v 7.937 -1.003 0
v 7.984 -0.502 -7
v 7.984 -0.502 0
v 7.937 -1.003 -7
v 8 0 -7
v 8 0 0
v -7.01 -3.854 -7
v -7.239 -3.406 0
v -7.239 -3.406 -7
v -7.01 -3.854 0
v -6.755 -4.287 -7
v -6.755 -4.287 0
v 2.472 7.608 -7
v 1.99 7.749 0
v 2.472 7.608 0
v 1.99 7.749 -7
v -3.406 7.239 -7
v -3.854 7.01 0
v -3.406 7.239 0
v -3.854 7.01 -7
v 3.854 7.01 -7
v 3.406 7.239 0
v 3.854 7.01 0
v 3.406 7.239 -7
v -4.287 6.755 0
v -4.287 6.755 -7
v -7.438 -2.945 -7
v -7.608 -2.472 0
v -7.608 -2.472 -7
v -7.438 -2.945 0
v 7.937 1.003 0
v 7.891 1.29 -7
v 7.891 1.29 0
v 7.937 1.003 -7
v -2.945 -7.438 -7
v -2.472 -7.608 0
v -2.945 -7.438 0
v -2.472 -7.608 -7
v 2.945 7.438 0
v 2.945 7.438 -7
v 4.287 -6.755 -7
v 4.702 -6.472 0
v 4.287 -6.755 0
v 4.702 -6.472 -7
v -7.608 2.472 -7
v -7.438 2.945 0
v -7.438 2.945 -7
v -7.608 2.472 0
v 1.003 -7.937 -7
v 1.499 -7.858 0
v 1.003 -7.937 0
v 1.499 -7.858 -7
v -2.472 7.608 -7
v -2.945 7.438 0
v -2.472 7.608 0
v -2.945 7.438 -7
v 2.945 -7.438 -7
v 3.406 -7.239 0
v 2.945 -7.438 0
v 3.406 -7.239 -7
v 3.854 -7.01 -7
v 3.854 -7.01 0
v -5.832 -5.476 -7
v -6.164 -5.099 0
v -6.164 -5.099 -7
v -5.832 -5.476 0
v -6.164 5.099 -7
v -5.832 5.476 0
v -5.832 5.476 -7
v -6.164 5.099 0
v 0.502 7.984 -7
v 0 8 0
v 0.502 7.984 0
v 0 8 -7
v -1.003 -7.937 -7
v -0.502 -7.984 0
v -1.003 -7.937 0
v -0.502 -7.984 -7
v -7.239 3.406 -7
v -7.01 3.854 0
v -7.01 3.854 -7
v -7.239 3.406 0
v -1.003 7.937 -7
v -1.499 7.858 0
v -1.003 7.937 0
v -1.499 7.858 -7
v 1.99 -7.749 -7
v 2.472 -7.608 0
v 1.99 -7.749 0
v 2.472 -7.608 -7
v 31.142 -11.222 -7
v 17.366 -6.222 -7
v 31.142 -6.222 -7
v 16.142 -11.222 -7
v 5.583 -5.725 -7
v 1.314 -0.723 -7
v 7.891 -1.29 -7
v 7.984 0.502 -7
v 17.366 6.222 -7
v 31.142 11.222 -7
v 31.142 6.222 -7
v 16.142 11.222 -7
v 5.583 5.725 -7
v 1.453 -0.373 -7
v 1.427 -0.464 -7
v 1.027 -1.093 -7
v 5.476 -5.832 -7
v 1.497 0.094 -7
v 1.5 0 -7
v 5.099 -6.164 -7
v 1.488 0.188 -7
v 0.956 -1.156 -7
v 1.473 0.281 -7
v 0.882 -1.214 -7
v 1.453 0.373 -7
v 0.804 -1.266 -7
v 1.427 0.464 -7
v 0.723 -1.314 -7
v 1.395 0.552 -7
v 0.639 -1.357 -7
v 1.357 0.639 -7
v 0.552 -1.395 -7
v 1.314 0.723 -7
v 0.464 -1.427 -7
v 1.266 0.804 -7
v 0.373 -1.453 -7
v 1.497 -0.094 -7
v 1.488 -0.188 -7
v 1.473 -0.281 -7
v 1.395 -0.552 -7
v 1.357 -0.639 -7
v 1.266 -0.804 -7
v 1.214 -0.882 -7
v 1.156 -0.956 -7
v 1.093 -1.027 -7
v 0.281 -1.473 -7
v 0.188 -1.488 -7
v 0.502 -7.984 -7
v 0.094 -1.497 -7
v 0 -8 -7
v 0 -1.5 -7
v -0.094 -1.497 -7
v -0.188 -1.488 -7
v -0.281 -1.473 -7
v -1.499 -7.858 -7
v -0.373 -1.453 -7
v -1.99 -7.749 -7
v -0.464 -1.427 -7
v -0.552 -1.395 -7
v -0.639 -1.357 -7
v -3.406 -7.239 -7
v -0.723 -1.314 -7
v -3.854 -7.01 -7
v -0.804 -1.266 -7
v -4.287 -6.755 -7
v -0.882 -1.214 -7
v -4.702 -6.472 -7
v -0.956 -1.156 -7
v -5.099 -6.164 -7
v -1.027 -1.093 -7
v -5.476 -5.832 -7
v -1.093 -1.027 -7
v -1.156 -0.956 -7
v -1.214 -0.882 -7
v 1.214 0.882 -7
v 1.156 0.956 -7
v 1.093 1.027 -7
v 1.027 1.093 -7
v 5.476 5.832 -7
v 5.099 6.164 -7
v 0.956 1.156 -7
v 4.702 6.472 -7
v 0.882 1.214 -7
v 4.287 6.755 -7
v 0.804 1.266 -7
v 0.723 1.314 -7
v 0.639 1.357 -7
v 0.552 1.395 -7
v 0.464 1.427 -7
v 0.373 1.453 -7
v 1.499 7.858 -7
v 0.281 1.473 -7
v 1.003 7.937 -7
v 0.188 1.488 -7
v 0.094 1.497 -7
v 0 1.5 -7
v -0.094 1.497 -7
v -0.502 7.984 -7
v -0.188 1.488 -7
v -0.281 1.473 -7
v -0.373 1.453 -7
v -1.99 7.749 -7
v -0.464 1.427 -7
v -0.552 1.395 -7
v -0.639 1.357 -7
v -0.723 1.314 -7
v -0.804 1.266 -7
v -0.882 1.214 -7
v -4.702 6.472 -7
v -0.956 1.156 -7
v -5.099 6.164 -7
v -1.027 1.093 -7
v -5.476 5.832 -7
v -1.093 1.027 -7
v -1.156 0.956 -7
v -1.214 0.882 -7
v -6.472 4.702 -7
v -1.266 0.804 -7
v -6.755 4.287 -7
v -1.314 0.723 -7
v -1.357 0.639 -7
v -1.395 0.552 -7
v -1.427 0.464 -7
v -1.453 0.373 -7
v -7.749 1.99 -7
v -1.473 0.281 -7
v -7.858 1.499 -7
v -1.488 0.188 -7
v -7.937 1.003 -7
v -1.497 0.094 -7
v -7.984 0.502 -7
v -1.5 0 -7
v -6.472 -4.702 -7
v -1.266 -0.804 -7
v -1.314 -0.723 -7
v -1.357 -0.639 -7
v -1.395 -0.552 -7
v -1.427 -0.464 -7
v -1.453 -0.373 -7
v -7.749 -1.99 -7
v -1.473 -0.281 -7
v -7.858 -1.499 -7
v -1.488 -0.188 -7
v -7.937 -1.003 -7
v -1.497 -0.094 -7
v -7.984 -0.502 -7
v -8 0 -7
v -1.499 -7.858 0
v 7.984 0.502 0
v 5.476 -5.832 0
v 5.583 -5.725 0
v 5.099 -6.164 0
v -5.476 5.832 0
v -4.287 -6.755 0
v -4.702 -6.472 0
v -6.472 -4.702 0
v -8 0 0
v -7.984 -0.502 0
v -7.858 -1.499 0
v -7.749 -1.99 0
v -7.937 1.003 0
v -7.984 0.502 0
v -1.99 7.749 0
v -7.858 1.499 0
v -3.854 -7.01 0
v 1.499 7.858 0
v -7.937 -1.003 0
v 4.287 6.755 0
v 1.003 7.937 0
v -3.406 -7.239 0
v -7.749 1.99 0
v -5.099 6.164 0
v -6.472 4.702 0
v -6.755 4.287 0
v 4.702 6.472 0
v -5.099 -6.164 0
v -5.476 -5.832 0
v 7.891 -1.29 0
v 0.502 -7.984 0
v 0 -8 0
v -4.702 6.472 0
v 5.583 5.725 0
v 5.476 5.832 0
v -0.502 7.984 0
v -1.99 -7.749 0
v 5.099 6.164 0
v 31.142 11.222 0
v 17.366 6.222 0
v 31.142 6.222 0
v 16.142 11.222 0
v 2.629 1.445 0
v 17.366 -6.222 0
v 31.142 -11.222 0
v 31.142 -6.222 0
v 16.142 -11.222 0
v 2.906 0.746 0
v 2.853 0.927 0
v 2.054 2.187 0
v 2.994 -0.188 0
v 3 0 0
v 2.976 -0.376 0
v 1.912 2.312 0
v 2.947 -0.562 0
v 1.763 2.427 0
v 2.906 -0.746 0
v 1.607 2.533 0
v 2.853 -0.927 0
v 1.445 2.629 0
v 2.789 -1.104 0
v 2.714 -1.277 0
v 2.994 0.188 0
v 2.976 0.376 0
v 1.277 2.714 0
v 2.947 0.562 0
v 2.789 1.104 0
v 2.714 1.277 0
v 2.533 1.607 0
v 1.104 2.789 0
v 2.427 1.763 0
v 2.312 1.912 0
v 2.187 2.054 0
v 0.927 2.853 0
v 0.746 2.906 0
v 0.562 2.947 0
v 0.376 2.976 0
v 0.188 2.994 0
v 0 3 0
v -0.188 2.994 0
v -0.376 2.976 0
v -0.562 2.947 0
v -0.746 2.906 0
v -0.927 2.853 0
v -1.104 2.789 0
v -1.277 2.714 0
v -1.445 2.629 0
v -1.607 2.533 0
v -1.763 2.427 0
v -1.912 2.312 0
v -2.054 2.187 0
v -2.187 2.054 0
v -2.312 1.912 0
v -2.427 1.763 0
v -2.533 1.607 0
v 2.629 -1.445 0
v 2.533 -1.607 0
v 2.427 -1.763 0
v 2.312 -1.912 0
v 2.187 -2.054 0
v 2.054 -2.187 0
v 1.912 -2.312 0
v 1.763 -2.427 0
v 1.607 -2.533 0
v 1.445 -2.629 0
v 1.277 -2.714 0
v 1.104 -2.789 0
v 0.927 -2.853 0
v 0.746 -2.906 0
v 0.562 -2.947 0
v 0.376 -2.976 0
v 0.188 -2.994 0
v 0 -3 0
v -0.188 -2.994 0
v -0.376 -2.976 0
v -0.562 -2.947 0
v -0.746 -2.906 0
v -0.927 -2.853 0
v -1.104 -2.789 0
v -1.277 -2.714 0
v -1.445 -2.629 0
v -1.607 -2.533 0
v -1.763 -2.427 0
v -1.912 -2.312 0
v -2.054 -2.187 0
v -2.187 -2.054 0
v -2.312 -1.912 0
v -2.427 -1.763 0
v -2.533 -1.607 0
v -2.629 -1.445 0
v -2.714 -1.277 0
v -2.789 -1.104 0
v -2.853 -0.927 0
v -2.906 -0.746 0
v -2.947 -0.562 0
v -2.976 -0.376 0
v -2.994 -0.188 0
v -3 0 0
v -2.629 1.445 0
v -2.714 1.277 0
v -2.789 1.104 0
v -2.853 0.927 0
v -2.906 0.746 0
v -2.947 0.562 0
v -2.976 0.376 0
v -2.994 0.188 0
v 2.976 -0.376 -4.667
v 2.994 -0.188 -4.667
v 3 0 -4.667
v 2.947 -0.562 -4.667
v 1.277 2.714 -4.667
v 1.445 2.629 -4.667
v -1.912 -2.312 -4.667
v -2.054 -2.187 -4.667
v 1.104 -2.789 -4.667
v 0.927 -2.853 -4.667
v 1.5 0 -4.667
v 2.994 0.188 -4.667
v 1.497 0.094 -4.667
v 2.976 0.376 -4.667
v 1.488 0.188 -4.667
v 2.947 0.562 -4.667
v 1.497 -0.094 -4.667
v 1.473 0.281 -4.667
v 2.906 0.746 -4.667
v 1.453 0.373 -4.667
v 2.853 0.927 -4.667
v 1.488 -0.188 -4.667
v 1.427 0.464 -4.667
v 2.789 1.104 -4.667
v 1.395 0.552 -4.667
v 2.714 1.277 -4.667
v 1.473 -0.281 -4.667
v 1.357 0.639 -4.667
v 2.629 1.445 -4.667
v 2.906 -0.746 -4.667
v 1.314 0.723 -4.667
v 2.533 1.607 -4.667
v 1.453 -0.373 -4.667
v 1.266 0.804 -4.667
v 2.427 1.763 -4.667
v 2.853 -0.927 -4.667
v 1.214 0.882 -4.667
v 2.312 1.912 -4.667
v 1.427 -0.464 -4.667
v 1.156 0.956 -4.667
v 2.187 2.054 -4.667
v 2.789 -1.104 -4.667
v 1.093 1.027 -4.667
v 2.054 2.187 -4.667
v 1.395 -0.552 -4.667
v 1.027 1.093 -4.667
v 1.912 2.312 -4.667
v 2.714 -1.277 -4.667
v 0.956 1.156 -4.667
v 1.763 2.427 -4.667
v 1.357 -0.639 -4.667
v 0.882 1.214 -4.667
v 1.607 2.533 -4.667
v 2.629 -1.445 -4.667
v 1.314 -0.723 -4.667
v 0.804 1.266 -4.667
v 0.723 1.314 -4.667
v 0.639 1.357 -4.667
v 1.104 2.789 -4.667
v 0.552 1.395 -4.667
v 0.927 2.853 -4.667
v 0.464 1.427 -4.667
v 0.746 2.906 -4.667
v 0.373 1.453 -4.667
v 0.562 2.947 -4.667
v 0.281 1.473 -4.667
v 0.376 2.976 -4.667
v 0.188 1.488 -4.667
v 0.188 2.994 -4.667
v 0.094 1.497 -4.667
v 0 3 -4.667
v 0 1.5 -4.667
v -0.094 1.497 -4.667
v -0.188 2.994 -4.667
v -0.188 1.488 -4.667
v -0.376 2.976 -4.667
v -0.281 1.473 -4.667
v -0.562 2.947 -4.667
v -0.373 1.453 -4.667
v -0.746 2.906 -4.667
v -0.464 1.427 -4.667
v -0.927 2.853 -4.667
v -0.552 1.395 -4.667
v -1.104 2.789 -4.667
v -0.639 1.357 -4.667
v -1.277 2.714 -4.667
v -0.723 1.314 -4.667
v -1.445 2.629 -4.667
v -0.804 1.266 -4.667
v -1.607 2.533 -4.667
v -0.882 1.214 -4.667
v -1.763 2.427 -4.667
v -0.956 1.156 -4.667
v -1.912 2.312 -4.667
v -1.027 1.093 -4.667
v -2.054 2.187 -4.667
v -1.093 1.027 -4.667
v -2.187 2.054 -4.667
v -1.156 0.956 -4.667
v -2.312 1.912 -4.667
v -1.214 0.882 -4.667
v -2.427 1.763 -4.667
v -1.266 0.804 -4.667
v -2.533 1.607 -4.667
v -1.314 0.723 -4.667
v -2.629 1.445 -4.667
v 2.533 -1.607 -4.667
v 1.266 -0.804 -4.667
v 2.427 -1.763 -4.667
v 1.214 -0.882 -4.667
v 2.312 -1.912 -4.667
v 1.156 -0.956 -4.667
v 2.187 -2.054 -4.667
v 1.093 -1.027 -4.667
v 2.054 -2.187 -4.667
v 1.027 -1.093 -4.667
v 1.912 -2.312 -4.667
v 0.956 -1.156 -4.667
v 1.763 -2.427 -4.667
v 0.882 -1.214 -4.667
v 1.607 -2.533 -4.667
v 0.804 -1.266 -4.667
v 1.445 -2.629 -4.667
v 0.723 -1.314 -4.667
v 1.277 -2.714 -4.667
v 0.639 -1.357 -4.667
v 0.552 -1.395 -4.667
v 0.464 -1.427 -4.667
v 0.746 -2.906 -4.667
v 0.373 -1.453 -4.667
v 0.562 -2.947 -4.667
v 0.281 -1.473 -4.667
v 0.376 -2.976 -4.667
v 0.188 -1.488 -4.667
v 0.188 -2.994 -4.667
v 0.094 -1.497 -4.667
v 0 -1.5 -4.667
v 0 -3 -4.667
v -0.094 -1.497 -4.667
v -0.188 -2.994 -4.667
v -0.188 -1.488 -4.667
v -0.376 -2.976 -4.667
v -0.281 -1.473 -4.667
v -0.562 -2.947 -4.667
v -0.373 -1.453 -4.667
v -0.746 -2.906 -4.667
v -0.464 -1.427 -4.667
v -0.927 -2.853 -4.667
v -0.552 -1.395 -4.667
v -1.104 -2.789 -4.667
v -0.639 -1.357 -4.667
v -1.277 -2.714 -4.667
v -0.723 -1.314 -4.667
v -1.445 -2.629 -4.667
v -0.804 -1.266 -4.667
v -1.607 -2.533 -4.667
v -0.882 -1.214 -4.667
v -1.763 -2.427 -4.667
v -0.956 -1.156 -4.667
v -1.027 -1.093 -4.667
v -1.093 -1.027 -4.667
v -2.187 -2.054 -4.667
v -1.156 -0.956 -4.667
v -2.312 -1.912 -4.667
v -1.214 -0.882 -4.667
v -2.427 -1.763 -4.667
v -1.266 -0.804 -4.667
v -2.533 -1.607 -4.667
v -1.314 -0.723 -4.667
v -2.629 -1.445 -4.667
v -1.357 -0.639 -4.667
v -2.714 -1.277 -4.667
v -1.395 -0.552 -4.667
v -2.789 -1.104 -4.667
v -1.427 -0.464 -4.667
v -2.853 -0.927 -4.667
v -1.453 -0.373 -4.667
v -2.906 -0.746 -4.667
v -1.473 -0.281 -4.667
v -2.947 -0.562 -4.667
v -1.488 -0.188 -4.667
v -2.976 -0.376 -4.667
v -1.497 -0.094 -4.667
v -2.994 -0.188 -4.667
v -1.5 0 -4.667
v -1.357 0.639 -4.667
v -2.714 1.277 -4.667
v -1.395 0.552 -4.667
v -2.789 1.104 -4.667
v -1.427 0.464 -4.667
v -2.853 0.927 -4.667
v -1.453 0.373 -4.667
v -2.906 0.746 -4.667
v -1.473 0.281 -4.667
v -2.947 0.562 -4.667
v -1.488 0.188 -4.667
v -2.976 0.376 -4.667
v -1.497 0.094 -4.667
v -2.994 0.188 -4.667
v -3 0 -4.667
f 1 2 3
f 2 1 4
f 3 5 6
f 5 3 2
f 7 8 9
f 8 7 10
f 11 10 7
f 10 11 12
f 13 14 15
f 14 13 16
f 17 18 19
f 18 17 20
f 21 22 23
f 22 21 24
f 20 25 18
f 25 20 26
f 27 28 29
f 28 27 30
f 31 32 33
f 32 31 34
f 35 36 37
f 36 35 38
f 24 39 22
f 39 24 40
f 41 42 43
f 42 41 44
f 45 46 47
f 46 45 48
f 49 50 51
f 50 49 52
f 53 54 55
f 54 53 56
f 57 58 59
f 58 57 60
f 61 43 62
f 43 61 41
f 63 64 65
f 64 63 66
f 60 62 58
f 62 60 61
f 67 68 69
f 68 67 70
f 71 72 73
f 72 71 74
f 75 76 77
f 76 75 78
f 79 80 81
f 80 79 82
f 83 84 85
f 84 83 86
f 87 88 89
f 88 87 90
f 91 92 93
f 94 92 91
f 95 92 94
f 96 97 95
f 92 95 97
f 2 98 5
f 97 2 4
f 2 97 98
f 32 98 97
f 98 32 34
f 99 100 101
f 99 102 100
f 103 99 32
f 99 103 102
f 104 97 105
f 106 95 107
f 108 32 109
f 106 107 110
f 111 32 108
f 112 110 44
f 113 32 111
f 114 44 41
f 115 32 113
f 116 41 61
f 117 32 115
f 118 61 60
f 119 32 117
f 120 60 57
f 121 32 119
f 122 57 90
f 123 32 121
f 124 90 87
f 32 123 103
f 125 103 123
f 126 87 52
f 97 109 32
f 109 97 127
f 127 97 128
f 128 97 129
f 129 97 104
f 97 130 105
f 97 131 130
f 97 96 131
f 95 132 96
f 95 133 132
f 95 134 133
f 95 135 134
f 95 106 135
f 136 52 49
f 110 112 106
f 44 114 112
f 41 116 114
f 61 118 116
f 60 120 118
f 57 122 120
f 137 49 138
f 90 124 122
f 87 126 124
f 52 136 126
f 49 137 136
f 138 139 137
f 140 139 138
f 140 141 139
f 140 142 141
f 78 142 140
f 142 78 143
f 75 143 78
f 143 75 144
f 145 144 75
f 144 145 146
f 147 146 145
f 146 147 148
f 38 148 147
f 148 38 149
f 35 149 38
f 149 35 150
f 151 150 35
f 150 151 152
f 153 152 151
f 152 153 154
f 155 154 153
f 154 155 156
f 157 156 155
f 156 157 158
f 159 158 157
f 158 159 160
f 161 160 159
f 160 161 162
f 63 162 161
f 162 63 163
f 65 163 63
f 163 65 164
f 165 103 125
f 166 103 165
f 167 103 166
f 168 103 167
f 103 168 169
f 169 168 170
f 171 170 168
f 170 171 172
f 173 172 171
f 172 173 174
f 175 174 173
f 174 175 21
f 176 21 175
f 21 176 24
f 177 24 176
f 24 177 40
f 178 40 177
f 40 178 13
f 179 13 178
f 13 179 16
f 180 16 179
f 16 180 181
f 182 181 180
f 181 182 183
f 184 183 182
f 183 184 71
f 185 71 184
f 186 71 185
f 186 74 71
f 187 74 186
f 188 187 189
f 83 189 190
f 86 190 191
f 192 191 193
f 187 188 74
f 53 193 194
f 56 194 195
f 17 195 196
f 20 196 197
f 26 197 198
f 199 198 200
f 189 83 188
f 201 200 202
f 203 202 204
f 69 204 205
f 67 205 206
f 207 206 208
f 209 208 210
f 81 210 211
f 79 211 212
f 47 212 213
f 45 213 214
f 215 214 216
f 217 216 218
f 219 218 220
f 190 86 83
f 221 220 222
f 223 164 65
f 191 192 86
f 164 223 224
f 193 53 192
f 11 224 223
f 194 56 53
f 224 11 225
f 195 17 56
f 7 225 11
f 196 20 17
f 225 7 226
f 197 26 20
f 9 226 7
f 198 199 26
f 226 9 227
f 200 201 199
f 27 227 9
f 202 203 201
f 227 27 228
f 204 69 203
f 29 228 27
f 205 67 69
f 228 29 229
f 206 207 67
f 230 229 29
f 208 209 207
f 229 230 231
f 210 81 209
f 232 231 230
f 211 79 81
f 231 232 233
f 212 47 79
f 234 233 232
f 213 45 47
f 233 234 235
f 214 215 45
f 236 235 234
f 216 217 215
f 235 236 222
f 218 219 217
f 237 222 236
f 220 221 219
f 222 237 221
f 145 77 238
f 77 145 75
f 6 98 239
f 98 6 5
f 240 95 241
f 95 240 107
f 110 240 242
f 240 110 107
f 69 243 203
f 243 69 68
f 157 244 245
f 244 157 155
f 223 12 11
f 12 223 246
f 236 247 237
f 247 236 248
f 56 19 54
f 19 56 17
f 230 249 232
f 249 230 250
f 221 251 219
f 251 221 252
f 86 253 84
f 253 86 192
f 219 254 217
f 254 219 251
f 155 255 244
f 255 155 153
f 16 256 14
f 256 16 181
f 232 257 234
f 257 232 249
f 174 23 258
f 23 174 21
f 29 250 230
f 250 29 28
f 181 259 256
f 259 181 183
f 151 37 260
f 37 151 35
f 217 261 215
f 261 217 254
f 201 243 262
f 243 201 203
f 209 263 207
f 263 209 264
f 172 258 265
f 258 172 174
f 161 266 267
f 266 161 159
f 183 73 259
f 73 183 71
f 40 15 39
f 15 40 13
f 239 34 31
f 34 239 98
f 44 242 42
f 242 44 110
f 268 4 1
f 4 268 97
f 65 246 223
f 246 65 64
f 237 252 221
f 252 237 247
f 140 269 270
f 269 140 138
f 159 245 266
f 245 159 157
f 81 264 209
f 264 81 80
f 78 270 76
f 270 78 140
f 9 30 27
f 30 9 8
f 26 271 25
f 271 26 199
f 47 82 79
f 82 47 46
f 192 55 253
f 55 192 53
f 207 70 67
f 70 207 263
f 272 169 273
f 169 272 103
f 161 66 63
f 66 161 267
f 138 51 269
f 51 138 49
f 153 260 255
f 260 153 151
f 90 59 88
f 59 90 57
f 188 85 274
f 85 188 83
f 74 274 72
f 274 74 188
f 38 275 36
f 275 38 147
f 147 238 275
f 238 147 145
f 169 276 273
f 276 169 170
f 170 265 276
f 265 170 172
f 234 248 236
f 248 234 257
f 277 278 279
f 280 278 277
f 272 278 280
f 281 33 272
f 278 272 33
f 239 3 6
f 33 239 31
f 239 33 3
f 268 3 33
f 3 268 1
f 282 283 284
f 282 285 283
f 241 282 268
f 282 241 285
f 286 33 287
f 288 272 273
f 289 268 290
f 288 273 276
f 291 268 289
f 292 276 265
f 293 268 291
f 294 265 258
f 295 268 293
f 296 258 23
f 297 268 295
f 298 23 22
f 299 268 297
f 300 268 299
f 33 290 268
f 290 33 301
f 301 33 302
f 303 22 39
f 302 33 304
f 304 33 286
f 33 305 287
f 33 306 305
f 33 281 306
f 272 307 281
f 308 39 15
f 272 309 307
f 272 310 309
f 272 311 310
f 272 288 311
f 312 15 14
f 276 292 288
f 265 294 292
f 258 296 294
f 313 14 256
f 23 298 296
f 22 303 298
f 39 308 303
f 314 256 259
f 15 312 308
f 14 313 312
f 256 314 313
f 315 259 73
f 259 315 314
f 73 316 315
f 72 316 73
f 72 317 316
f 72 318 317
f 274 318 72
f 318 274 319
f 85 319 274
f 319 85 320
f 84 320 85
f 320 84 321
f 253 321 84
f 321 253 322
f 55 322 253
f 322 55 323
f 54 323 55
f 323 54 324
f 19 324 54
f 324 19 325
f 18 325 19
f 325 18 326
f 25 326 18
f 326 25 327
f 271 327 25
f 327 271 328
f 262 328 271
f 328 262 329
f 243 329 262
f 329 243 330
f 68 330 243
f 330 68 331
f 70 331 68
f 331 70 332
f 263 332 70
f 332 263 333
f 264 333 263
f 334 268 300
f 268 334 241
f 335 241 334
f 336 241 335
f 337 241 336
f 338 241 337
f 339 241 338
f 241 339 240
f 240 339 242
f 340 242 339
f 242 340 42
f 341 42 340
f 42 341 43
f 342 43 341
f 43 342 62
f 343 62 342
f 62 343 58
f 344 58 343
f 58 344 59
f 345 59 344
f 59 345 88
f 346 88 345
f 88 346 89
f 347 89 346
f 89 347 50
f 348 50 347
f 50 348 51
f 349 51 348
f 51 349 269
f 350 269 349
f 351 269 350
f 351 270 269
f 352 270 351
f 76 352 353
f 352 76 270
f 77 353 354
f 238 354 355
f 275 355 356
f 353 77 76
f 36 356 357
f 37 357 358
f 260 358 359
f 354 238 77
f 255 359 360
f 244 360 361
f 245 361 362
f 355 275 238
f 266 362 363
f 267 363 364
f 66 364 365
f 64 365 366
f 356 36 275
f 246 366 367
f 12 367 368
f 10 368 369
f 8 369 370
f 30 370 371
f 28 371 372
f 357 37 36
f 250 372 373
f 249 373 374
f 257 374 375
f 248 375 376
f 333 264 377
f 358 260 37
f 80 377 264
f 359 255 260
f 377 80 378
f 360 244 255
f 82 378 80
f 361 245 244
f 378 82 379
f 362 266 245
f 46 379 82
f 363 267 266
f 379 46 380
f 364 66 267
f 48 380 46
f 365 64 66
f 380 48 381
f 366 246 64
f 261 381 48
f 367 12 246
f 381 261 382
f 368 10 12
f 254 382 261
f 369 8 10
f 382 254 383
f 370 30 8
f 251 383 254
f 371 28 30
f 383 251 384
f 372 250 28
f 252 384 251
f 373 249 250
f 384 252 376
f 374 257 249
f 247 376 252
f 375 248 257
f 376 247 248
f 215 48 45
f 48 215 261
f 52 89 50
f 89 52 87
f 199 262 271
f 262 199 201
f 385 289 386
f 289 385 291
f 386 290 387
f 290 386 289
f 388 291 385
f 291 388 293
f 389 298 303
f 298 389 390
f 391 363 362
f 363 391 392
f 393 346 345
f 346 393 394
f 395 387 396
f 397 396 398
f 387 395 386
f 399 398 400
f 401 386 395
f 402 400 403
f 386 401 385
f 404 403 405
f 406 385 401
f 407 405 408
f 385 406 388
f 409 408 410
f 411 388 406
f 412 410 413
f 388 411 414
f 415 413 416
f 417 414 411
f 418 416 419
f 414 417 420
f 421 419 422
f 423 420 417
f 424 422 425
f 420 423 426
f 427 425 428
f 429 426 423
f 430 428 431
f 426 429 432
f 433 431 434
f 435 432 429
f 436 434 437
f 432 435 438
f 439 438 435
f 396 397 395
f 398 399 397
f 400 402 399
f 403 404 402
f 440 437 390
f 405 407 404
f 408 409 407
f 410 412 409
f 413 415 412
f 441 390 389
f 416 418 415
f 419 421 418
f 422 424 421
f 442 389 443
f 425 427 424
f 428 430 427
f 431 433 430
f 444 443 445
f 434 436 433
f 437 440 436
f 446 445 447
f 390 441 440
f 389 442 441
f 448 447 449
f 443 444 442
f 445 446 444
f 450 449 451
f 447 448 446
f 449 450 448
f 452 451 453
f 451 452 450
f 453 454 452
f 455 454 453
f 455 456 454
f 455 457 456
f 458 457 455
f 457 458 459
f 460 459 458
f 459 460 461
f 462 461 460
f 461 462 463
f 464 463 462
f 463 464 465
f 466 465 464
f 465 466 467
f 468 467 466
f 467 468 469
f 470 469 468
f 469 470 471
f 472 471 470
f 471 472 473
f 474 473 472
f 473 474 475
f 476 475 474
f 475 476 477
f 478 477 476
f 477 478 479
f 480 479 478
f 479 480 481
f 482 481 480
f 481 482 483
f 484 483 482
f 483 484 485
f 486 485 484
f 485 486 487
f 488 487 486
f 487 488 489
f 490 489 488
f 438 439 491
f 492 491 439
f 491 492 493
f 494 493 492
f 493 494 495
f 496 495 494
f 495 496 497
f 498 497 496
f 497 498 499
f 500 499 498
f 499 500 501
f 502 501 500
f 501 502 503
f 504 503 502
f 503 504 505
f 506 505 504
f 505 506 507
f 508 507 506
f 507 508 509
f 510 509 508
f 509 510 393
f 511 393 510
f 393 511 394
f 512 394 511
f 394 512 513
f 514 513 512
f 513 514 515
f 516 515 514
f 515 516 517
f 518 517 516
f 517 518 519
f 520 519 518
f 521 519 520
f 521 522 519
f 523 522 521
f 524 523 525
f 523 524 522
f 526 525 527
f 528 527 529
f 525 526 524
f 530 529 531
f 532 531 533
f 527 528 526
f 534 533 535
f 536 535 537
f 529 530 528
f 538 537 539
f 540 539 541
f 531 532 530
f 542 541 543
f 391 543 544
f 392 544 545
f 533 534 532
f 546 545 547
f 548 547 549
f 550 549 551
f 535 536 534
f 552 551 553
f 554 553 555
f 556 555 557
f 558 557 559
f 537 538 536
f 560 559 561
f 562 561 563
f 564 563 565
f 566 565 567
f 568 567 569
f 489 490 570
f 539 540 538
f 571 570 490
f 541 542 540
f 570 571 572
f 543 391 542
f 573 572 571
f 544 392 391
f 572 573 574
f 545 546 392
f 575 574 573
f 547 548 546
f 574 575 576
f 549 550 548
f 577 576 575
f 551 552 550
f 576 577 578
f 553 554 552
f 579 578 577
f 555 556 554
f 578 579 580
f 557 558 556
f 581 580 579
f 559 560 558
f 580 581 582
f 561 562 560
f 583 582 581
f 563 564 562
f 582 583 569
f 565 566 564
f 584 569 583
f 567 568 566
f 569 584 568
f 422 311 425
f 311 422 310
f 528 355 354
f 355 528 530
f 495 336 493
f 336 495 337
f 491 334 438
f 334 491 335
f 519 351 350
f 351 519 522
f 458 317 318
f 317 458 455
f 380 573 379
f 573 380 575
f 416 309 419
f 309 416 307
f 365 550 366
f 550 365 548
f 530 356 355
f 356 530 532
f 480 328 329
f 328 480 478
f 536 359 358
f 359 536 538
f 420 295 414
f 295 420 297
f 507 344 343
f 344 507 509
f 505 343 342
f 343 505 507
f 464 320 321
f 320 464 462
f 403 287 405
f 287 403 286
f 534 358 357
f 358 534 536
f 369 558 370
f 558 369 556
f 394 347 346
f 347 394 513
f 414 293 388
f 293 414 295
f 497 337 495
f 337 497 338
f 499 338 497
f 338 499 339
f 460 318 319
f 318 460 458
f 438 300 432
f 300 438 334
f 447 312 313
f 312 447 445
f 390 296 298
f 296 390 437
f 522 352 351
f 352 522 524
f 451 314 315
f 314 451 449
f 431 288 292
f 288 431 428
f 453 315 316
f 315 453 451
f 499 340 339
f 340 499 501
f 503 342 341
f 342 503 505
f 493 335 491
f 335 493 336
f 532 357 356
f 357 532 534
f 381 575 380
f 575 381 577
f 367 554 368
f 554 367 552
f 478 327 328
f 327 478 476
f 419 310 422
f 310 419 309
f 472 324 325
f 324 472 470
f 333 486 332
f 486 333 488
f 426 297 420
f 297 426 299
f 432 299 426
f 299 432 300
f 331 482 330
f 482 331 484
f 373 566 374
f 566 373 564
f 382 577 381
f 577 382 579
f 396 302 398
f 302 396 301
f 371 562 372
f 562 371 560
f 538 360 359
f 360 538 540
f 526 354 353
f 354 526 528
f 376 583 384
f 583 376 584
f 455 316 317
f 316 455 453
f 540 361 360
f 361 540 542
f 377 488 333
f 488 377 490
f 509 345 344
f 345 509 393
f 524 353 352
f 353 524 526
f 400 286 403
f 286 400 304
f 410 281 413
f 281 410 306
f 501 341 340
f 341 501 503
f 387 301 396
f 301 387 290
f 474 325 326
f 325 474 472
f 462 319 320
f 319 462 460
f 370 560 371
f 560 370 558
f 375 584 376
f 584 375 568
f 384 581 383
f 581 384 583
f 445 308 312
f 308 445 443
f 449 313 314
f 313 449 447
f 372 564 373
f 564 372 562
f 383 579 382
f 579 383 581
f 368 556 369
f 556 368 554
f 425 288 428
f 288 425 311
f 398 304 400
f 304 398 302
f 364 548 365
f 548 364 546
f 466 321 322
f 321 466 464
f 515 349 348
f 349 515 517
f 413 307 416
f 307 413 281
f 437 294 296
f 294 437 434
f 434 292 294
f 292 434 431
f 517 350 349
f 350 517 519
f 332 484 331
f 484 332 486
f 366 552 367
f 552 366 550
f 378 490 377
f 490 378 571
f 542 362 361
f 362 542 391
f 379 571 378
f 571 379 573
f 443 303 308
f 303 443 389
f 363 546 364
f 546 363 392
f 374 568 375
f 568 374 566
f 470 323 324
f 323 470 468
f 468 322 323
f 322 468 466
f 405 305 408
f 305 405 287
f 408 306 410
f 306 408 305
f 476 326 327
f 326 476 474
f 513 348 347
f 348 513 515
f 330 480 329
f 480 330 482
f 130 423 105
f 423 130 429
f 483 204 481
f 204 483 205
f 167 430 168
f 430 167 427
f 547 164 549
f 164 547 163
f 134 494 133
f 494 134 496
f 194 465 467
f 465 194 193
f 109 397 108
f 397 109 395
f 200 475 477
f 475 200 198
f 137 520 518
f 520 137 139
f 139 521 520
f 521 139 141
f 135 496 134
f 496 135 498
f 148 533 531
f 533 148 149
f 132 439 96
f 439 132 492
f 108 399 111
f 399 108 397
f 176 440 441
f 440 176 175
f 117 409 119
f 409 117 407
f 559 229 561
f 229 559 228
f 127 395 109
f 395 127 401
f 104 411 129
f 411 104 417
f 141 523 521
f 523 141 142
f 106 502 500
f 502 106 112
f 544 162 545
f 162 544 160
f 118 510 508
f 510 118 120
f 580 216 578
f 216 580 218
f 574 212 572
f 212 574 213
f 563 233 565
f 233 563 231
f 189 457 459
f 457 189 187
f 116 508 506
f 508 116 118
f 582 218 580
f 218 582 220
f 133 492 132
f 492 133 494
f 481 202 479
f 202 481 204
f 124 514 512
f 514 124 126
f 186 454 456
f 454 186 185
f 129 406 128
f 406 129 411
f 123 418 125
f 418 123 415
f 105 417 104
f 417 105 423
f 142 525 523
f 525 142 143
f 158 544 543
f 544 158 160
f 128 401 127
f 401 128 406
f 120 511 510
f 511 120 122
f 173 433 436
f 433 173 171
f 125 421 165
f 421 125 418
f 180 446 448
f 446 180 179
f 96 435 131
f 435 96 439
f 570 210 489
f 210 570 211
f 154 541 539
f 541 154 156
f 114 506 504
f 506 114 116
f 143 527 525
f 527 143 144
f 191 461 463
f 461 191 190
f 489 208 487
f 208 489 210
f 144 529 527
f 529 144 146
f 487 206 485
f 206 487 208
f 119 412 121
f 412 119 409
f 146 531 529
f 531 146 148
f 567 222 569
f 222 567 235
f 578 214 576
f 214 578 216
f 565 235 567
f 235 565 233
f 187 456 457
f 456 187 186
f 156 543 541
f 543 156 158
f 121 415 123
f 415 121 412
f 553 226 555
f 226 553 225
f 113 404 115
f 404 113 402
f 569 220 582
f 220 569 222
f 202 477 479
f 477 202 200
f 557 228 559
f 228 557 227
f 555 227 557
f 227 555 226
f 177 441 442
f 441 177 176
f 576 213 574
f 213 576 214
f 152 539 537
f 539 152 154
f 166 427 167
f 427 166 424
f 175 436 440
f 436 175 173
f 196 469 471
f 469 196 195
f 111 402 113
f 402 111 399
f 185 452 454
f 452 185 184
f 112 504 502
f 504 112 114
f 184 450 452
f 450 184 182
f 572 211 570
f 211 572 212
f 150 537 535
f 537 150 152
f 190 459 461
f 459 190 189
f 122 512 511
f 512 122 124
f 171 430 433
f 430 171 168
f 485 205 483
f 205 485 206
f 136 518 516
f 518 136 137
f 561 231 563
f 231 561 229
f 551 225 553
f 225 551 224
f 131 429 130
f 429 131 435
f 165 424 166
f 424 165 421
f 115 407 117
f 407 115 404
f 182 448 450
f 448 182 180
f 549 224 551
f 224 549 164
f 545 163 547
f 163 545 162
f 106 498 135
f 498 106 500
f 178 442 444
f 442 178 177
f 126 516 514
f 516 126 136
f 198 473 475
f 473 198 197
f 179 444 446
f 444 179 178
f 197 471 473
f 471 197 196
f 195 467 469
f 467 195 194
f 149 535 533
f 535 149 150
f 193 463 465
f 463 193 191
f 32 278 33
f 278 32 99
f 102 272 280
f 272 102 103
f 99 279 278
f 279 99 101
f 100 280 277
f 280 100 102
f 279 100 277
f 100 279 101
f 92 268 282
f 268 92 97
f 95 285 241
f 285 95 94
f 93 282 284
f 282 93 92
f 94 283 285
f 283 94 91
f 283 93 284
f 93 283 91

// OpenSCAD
servoInnerDiameter = 6;
extensionLength = 11.0;
screwDiameter = 3;
barWidth = 5;
barAngle = 55;
armLength = 15;
componentHeight = 7;
$fn = 100;
module servoMount(){
    difference(){
        cylinder(d=servoInnerDiameter+10, h=componentHeight);
        cylinder(d=servoInnerDiameter, h=componentHeight/1.5);
        cylinder(d=screwDiameter, h=componentHeight);
    }
}
module armBase(){
    rotate([0,0,-barAngle/2])translate([(servoInnerDiameter+1)/2,-barWidth/2,0]) union(){
    cube([extensionLength+5, barWidth, componentHeight]);
        translate([extensionLength+5,0,0])rotate([0,0,barAngle/2])cube([armLength, barWidth, componentHeight]);
    }
}
module arms(armType=0){
   union(){
       armBase();
       mirror([0,1,0])armBase();
   }
}
module drawAll(){
    union(){
        servoMount();
        arms();

    }
}
rotate([180,0,0])
drawAll();
